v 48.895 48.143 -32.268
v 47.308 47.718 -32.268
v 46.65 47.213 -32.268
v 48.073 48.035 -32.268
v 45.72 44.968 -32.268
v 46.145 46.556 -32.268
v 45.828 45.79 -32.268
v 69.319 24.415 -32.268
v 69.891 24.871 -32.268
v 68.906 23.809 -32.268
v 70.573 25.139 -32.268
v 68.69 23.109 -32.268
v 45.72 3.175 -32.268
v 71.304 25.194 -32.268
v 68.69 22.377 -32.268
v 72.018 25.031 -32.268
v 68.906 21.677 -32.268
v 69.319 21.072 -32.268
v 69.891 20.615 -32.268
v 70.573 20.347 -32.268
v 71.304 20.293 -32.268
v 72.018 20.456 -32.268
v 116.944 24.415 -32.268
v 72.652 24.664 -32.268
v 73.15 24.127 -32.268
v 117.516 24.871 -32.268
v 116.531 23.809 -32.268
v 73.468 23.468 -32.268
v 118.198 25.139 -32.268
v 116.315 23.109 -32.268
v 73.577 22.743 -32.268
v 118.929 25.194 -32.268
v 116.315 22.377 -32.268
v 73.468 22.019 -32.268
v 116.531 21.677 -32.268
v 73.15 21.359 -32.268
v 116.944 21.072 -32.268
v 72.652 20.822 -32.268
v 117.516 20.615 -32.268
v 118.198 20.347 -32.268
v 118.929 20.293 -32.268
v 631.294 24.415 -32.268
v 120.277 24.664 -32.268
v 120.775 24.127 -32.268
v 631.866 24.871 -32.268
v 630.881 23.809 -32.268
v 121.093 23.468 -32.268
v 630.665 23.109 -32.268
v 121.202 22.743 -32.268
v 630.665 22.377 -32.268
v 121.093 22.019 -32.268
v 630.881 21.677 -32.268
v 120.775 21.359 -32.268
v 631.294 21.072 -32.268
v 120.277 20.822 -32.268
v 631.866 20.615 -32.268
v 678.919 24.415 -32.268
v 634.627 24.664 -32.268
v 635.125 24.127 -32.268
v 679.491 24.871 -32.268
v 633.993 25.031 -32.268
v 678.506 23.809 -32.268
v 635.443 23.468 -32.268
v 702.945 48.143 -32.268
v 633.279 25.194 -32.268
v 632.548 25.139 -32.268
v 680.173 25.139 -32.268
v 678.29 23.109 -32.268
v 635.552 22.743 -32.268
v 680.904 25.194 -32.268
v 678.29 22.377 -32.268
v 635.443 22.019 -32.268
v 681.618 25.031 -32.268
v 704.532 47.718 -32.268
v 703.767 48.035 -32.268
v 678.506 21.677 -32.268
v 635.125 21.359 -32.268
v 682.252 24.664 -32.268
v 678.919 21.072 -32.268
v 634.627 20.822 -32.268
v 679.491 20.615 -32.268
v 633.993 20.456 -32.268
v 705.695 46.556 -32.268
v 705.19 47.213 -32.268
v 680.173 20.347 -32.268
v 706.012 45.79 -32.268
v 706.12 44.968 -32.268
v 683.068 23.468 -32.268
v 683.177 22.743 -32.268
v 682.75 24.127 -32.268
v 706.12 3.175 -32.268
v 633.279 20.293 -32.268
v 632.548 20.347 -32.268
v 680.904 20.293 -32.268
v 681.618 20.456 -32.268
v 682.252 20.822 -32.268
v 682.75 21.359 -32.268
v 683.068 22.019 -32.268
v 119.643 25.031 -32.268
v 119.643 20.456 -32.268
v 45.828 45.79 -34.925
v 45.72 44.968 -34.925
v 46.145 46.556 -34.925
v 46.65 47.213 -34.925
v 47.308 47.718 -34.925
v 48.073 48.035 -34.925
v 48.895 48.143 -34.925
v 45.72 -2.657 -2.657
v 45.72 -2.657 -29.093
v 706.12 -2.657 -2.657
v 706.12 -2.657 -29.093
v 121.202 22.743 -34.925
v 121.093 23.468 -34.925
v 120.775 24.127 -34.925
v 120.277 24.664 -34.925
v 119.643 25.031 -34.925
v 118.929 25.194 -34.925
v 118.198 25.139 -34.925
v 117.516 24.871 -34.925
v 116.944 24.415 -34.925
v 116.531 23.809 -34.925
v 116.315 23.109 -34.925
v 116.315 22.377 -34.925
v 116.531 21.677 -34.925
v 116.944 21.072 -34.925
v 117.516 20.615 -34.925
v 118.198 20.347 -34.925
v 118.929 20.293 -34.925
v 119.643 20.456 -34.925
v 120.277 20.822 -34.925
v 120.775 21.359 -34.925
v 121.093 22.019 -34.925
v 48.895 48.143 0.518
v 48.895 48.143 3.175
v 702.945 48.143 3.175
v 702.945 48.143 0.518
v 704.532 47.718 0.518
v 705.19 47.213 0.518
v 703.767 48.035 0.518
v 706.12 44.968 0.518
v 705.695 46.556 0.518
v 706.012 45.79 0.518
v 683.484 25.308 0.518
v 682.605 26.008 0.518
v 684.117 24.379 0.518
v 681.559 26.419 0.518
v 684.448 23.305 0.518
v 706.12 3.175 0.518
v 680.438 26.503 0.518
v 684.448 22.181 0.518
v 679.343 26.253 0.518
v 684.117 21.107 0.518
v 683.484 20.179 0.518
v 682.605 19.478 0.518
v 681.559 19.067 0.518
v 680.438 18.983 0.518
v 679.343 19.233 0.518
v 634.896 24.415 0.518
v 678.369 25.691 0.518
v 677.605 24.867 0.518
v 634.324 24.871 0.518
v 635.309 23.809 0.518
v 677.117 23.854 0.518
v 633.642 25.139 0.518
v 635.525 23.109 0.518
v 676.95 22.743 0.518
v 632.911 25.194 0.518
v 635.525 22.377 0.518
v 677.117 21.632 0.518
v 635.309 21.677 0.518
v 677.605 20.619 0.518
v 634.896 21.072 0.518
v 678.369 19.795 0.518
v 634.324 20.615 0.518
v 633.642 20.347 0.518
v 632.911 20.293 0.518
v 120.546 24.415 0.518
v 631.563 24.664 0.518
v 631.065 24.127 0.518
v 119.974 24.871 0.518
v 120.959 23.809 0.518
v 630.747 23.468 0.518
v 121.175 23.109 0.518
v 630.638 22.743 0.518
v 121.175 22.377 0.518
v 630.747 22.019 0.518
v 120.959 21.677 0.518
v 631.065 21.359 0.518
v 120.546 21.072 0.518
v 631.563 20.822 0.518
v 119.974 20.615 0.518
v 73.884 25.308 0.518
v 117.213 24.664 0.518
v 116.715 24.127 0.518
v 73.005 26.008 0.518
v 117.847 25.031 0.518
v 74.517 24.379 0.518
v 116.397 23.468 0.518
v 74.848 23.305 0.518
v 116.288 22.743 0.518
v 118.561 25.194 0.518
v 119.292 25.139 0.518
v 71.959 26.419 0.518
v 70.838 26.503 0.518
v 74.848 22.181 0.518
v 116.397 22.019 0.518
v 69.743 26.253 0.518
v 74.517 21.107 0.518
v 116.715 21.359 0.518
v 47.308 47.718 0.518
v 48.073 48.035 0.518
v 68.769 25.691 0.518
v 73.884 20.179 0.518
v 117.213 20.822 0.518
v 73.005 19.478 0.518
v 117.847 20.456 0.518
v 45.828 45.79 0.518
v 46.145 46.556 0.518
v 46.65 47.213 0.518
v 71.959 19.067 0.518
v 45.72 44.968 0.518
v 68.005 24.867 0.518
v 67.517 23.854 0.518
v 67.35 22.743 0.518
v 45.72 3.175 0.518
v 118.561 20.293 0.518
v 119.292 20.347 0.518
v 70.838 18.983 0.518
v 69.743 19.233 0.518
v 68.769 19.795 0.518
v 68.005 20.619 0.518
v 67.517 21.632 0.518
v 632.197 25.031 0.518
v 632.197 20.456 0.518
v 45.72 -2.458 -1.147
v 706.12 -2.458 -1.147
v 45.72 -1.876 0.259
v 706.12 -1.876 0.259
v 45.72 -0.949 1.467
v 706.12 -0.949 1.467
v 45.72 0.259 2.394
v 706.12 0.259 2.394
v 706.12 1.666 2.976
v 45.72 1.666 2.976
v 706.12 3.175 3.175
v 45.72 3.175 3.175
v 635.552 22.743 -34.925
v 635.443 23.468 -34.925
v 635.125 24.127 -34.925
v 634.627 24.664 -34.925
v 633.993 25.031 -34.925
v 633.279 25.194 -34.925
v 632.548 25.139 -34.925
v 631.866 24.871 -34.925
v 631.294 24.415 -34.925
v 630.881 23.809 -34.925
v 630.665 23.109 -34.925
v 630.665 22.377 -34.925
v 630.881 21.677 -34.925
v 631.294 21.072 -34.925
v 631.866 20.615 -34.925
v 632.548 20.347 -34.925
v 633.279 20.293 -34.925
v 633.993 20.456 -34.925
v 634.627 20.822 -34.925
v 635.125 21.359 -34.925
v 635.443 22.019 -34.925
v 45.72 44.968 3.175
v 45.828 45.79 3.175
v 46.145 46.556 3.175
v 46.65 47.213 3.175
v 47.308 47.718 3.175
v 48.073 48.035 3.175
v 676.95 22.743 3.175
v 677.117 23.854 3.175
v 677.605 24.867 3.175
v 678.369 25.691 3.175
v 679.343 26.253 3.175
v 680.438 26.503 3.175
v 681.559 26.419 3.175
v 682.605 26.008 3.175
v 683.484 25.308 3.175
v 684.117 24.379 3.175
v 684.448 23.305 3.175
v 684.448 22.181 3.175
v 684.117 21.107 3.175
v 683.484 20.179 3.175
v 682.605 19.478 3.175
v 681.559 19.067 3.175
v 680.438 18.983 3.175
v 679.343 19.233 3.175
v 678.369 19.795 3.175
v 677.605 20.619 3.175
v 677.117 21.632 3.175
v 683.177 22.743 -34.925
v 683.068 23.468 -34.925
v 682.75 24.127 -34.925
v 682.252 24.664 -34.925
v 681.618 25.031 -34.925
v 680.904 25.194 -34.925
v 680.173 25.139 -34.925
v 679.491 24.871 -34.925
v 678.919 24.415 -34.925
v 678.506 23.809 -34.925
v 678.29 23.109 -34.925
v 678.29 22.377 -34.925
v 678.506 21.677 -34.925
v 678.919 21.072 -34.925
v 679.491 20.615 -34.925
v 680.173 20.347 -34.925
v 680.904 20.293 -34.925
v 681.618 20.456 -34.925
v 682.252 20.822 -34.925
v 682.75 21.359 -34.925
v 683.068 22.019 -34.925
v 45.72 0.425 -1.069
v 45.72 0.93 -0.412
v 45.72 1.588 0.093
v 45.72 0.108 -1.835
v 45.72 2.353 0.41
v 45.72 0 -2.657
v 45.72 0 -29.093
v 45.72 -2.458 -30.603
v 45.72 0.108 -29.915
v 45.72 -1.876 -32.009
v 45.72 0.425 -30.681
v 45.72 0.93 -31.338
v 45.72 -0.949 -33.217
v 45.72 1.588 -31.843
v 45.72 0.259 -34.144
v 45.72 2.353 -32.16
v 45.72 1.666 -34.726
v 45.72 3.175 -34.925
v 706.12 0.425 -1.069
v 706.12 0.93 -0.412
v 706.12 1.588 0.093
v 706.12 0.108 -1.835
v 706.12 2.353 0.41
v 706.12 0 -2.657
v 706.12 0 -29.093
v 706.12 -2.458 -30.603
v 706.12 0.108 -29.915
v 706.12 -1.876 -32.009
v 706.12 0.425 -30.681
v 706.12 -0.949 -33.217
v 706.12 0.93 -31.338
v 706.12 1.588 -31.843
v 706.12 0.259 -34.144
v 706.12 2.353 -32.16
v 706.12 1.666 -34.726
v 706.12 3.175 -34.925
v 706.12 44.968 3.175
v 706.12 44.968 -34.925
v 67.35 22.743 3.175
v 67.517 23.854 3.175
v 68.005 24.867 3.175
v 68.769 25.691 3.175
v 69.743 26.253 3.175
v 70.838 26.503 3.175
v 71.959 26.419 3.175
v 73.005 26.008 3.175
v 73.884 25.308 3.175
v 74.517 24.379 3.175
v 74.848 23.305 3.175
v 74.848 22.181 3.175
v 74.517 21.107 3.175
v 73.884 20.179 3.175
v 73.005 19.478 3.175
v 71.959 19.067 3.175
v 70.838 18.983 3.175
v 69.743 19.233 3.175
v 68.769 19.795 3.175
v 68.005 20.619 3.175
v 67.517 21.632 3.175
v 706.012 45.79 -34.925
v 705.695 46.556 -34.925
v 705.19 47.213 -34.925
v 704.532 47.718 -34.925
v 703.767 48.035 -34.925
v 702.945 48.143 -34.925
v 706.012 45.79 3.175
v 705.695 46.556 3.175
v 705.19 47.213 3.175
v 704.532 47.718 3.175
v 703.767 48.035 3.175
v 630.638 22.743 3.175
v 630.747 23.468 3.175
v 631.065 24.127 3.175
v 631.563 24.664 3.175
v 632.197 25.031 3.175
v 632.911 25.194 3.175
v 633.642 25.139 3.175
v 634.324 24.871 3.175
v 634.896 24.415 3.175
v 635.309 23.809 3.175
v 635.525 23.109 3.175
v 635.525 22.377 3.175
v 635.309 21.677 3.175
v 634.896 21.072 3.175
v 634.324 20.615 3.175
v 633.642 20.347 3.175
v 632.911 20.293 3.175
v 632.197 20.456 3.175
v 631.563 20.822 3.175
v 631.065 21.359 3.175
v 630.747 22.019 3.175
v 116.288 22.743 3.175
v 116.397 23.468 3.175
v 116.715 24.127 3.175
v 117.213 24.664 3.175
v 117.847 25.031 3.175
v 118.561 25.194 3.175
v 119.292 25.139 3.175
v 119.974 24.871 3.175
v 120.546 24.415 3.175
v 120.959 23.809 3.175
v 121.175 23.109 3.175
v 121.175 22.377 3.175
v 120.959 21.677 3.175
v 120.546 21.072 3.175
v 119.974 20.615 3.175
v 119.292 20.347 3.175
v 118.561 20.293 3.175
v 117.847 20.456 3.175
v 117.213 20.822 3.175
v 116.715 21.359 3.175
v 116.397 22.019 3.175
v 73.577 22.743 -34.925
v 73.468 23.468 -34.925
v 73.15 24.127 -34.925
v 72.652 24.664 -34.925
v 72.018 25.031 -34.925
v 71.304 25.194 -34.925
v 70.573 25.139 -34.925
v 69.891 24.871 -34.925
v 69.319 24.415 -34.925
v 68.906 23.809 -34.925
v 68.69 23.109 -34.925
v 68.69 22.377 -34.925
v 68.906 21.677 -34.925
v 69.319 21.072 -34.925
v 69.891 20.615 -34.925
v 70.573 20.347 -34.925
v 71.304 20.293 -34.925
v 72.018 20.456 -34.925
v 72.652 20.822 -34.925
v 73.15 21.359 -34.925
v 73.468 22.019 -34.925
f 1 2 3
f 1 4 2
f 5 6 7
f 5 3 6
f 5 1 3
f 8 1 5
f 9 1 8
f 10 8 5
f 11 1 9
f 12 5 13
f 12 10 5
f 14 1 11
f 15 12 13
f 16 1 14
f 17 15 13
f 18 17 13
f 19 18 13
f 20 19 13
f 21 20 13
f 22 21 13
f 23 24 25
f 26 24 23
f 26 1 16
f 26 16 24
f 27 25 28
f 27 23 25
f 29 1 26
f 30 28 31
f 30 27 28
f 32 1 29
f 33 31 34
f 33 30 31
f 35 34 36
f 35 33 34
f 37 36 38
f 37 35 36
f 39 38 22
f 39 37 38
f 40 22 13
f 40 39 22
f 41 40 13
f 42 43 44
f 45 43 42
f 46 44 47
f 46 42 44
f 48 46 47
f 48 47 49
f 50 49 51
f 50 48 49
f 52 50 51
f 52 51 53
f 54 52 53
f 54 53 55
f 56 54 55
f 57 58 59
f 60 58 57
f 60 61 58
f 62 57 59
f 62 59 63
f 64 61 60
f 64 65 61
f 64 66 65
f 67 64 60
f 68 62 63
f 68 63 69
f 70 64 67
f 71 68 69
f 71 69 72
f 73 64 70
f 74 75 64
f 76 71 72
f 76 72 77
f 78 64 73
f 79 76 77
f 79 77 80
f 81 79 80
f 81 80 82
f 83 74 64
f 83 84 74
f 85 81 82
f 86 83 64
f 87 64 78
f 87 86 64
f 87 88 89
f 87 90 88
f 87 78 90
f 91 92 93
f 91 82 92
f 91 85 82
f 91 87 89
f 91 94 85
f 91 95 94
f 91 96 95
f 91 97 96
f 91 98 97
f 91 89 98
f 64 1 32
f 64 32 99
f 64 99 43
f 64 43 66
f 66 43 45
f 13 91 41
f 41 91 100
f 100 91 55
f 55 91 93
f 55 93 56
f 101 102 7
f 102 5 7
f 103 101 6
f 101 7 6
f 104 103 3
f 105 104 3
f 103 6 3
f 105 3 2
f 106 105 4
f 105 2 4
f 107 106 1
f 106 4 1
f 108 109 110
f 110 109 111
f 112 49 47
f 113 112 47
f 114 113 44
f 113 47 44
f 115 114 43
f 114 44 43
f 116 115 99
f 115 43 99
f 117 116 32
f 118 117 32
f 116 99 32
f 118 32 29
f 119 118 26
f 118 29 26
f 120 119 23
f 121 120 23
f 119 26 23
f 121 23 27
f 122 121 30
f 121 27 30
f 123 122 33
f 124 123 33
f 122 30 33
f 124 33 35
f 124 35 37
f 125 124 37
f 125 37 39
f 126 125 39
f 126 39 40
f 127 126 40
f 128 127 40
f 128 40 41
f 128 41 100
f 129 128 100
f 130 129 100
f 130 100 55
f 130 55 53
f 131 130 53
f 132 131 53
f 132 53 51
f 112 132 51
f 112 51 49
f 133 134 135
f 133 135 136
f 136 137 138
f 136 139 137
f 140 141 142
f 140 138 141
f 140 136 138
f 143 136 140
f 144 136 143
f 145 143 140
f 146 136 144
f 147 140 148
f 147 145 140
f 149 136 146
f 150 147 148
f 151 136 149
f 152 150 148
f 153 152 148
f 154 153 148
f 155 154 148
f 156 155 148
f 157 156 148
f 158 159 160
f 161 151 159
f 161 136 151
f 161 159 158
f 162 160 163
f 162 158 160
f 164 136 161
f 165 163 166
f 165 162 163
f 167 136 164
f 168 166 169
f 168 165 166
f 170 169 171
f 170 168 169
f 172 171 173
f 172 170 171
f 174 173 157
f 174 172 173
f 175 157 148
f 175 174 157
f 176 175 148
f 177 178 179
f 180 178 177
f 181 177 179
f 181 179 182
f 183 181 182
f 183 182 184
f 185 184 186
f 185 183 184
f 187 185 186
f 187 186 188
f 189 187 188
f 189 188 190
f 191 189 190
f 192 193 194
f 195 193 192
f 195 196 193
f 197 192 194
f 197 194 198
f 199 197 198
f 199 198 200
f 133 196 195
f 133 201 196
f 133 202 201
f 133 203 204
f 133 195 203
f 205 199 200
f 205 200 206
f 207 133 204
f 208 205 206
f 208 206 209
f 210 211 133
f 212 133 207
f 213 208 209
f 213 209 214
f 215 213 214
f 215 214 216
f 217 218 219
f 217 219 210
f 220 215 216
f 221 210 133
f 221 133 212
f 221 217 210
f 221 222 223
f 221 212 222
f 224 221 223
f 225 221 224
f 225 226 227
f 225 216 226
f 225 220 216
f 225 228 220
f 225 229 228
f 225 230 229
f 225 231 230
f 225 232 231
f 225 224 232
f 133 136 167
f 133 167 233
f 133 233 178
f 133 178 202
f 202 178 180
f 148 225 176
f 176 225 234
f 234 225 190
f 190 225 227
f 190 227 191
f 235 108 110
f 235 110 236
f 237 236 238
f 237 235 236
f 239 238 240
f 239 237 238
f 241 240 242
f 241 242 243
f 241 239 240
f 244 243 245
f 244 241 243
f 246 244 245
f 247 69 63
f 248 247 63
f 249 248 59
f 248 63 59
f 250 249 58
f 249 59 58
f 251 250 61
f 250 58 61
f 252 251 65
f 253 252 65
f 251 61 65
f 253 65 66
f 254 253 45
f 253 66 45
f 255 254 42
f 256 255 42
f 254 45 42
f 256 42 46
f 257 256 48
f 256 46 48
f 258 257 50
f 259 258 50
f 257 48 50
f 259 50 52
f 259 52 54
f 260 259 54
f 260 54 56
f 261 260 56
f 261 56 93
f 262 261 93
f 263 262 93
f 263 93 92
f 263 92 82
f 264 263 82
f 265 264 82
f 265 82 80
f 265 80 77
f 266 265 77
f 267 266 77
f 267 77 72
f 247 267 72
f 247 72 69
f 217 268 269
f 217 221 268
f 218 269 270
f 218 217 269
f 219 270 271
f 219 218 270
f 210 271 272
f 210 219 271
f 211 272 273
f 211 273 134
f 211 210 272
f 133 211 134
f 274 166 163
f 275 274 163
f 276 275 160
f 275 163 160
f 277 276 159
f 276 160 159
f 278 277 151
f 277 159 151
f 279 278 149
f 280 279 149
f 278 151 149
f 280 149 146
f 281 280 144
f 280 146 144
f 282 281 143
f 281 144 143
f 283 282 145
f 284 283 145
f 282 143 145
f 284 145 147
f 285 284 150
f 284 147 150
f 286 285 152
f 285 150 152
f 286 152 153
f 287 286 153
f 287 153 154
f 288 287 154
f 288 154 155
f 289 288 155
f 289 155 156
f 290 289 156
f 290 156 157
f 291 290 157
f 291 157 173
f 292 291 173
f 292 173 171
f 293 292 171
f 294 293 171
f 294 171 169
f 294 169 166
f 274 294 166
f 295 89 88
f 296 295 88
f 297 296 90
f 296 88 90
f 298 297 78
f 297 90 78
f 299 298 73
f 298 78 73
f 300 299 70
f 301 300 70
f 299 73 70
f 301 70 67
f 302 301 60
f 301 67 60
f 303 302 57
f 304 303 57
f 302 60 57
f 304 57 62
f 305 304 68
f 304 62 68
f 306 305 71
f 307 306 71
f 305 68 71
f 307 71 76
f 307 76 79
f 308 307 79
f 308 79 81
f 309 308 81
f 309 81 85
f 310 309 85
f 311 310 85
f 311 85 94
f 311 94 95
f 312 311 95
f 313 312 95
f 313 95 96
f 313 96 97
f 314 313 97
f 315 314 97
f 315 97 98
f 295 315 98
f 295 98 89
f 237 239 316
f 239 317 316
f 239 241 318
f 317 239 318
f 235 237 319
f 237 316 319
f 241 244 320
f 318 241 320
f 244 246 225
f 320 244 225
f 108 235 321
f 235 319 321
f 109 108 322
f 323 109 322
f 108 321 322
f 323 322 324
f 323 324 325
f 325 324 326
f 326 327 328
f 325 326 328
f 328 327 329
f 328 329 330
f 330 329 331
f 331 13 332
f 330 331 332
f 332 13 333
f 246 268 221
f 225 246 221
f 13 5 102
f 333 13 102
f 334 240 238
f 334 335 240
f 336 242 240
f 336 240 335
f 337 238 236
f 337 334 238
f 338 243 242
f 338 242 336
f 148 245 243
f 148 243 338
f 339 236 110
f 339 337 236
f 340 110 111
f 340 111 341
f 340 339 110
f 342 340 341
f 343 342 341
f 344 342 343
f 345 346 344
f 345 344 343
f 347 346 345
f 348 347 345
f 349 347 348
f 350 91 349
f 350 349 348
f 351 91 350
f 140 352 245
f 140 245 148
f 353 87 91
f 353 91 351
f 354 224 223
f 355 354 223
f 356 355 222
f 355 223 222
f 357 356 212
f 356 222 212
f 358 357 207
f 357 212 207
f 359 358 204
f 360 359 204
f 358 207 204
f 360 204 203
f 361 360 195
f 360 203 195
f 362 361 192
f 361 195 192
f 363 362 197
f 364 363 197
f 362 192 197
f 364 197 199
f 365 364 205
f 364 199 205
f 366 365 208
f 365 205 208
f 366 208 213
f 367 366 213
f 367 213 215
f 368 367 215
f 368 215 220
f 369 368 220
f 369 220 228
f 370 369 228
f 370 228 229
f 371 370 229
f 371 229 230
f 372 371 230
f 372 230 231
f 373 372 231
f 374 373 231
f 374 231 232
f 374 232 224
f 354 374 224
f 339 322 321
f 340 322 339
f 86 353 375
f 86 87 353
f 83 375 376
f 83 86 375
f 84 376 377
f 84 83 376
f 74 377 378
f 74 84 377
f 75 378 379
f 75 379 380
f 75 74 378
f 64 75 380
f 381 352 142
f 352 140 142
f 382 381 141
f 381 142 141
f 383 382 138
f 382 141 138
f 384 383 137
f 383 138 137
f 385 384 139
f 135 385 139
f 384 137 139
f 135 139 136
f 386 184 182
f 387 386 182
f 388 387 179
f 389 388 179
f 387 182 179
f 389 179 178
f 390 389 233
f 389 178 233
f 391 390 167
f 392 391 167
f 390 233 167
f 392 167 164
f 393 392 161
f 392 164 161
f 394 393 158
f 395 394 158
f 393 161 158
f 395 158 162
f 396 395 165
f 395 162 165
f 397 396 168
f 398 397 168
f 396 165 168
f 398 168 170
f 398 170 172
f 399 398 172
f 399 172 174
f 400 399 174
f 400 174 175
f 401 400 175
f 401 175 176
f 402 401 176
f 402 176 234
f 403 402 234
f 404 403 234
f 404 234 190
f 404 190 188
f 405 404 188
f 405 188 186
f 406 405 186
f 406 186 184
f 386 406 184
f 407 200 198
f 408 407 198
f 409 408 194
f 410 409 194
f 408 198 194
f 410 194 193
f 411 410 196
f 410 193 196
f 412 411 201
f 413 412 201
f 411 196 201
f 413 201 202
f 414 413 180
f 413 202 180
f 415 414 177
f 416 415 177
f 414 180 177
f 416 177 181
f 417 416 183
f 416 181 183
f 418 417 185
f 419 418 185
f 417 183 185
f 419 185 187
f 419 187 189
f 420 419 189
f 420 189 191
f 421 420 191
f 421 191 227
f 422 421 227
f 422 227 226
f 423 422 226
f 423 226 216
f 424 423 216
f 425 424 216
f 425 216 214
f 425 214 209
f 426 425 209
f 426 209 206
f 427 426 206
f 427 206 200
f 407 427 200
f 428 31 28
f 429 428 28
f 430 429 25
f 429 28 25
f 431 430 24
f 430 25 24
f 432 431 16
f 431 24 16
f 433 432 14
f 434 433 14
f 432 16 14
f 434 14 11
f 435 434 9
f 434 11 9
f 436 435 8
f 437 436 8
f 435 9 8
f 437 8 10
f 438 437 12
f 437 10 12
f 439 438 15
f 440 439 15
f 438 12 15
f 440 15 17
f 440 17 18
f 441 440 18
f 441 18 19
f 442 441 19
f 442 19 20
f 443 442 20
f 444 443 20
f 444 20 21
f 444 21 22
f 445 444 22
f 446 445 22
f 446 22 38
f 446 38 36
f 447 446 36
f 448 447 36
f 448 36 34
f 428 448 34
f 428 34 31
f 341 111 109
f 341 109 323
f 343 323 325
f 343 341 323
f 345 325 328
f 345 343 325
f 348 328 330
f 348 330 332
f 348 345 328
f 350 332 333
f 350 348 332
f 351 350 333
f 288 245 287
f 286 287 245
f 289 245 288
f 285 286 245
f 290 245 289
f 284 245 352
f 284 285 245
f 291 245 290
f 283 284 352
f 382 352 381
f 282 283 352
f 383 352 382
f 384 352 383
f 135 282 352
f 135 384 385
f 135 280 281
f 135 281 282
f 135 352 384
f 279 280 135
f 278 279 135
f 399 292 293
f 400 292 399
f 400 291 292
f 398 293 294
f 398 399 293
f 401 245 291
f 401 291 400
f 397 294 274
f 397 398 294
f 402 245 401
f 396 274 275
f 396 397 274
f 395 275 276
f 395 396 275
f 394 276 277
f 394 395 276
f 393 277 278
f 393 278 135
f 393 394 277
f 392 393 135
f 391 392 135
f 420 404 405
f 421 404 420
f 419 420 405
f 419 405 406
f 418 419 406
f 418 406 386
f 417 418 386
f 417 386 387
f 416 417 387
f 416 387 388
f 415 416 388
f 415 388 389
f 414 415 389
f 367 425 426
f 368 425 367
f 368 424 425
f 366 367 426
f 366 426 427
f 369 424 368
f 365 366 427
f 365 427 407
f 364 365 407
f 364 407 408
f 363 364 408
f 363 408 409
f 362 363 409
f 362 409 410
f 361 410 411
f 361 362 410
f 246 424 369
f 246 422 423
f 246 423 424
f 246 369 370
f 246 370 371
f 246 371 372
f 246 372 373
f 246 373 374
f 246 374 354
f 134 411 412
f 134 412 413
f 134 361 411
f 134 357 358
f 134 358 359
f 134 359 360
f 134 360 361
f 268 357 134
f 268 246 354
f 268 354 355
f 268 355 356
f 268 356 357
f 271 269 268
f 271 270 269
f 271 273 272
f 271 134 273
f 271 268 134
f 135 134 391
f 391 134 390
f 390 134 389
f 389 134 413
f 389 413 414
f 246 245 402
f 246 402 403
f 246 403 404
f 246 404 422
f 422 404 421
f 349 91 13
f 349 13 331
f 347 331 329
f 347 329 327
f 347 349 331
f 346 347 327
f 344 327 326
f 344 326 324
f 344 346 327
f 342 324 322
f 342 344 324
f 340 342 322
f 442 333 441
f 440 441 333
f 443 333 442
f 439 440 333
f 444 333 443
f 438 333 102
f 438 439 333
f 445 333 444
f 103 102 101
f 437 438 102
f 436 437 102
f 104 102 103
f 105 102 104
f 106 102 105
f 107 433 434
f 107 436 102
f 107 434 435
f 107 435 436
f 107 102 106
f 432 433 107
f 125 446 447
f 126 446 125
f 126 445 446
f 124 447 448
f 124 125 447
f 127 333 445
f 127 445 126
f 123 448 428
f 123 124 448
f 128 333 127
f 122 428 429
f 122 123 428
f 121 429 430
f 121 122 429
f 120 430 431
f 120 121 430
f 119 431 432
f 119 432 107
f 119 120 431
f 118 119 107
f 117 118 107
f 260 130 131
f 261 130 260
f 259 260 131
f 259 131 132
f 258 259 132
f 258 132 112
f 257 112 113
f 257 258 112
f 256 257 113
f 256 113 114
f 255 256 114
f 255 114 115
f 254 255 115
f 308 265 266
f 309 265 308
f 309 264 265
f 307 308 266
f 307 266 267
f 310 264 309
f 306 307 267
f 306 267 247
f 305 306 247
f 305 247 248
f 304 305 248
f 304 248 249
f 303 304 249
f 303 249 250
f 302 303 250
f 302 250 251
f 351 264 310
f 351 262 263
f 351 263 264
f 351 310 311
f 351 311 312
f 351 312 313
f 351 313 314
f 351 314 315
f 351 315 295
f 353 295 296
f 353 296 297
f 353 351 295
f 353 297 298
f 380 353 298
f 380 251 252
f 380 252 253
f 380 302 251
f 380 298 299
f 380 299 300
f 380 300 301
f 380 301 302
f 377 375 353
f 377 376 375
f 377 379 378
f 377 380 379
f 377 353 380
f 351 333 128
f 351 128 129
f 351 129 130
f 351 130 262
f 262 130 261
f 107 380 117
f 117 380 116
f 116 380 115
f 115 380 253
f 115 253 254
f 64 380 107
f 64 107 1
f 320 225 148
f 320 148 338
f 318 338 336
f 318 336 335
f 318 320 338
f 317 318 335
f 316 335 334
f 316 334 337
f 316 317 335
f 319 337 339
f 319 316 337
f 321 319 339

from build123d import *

# Parameters (mm, degrees)
SKETCH1_W                            = 660.4
SKETCH1_H                            = 38.1
BASE_FLANGE1_DEPTH                   = 2.65684
EDGE_FLANGE1_STRIP_W                 = 16.97736
EDGE_FLANGE1_STRIP_H                 = 2.65684
EDGE_FLANGE1_STRIP_CUT_DEPTH         = 660.4
EDGE_FLANGE1_STRIP_2_W               = 16.97736
EDGE_FLANGE1_STRIP_2_H               = 2.65684
EDGE_FLANGE1_STRIP_CUT_2_DEPTH       = 660.4
EDGE_FLANGE1_DEPTH                   = 660.4
EDGE_FLANGE1_BEND_DEPTH              = 660.4
F_10_0_1935_DIAMETER_HOLE2_D         = 4.9149
F_10_0_1935_DIAMETER_HOLE2_DEPTH     = 2.65684
FILLET1_R                            = 3.175
F_10_0_1935_DIAMETER_HOLE3_D         = 4.9149
F_19_64_0_29688_DIAMETER_HOLE1_D     = 7.540752
F_19_64_0_29688_DIAMETER_HOLE1_DEPTH = 2.65684


# Sheet-metal steps are written as plain solids
with BuildPart() as part:
    # Sketch1 → Base-Flange1 (new body)
    with BuildSketch(Plane(origin=(0, 0, 0), x_dir=(1, 0, 0), z_dir=(0, 1, 0))):
        with Locations((375.92, 15.875)):
            Rectangle(SKETCH1_W, SKETCH1_H)
    extrude(amount=-BASE_FLANGE1_DEPTH)

    # Edge-Flange1 strip (across the edge) → Edge-Flange1 strip cut (cut)
    with BuildSketch(Plane(origin=(45.72, 0, 3.175), x_dir=(0, 0, -1), z_dir=(1, 0, 0))):
        with Locations((-2.65684, -1.32842)):
            Rectangle(EDGE_FLANGE1_STRIP_W, EDGE_FLANGE1_STRIP_H)
    extrude(amount=EDGE_FLANGE1_STRIP_CUT_DEPTH, mode=Mode.SUBTRACT)

    # Edge-Flange1 strip 2 (across the edge) → Edge-Flange1 strip cut 2 (cut)
    with BuildSketch(Plane(origin=(706.12, 0, -34.925), x_dir=(0, 0, 1), z_dir=(-1, 0, 0))):
        with Locations((-2.65684, -1.32842)):
            Rectangle(EDGE_FLANGE1_STRIP_2_W, EDGE_FLANGE1_STRIP_2_H)
    extrude(amount=EDGE_FLANGE1_STRIP_CUT_2_DEPTH, mode=Mode.SUBTRACT)

    # Edge-Flange1 section (across the edge) → Edge-Flange1 (add)
    with BuildSketch(Plane(origin=(45.72, 0, 3.175), x_dir=(0, 0, -1), z_dir=(1, 0, 0))):
        with BuildLine():
            Line((0, 3.175), (0, 48.14316))
            Line((0, 48.14316), (2.65684, 48.14316))
            Line((2.65684, 48.14316), (2.65684, 3.175))
            ThreePointArc((2.65684, 3.175), (3.58677597, 0.92993597), (5.83184, 0))
            Line((5.83184, 0), (5.83184, -2.65684))
            ThreePointArc((5.83184, -2.65684), (1.708106389, -0.948733611), (0, 3.175))
        make_face()
    extrude(amount=EDGE_FLANGE1_DEPTH)

    # Edge-Flange1 section 2 (across the edge) → Edge-Flange1 bend (add)
    with BuildSketch(Plane(origin=(706.12, 0, -34.925), x_dir=(0, 0, 1), z_dir=(-1, 0, 0))):
        with BuildLine():
            Line((0, 3.175), (0, 48.14316))
            Line((0, 48.14316), (2.65684, 48.14316))
            Line((2.65684, 48.14316), (2.65684, 3.175))
            ThreePointArc((2.65684, 3.175), (3.58677597, 0.92993597), (5.83184, 0))
            Line((5.83184, 0), (5.83184, -2.65684))
            ThreePointArc((5.83184, -2.65684), (1.708106389, -0.948733611), (0, 3.175))
        make_face()
    extrude(amount=EDGE_FLANGE1_BEND_DEPTH)

    # #10 (0.1935) Diameter Hole2
    with Locations(Plane(origin=(0, 0, -34.925), x_dir=(-1, 0, 0), z_dir=(0, 0, -1))):
        with Locations((-680.72, 22.74316), (-633.095, 22.74316), (-118.745, 22.74316), (-71.12, 22.74316)):
            Hole(F_10_0_1935_DIAMETER_HOLE2_D / 2, depth=F_10_0_1935_DIAMETER_HOLE2_DEPTH)

    # Fillet1
    fillet1_edges = [part.edges().sort_by_distance(p)[0] for p in [
        (45.72, 48.14316, 1.84658),
        (706.12, 48.14316, 1.84658),
        (706.12, 48.14316, -33.59658),
        (45.72, 48.14316, -33.59658),
    ]]
    fillet(fillet1_edges, radius=FILLET1_R)

    # #10 (0.1935) Diameter Hole3 (through all)
    with Locations(Plane.XY.offset(3.175)):
        with Locations((633.095, 22.74316), (118.745, 22.74316)):
            Hole(F_10_0_1935_DIAMETER_HOLE3_D / 2)

    # 19/64 (0.29688) Diameter Hole1
    with Locations(Plane.XY.offset(3.175)):
        with Locations((71.12, 22.74316), (680.72, 22.74316)):
            Hole(F_19_64_0_29688_DIAMETER_HOLE1_D / 2, depth=F_19_64_0_29688_DIAMETER_HOLE1_DEPTH)


solid = part.part
